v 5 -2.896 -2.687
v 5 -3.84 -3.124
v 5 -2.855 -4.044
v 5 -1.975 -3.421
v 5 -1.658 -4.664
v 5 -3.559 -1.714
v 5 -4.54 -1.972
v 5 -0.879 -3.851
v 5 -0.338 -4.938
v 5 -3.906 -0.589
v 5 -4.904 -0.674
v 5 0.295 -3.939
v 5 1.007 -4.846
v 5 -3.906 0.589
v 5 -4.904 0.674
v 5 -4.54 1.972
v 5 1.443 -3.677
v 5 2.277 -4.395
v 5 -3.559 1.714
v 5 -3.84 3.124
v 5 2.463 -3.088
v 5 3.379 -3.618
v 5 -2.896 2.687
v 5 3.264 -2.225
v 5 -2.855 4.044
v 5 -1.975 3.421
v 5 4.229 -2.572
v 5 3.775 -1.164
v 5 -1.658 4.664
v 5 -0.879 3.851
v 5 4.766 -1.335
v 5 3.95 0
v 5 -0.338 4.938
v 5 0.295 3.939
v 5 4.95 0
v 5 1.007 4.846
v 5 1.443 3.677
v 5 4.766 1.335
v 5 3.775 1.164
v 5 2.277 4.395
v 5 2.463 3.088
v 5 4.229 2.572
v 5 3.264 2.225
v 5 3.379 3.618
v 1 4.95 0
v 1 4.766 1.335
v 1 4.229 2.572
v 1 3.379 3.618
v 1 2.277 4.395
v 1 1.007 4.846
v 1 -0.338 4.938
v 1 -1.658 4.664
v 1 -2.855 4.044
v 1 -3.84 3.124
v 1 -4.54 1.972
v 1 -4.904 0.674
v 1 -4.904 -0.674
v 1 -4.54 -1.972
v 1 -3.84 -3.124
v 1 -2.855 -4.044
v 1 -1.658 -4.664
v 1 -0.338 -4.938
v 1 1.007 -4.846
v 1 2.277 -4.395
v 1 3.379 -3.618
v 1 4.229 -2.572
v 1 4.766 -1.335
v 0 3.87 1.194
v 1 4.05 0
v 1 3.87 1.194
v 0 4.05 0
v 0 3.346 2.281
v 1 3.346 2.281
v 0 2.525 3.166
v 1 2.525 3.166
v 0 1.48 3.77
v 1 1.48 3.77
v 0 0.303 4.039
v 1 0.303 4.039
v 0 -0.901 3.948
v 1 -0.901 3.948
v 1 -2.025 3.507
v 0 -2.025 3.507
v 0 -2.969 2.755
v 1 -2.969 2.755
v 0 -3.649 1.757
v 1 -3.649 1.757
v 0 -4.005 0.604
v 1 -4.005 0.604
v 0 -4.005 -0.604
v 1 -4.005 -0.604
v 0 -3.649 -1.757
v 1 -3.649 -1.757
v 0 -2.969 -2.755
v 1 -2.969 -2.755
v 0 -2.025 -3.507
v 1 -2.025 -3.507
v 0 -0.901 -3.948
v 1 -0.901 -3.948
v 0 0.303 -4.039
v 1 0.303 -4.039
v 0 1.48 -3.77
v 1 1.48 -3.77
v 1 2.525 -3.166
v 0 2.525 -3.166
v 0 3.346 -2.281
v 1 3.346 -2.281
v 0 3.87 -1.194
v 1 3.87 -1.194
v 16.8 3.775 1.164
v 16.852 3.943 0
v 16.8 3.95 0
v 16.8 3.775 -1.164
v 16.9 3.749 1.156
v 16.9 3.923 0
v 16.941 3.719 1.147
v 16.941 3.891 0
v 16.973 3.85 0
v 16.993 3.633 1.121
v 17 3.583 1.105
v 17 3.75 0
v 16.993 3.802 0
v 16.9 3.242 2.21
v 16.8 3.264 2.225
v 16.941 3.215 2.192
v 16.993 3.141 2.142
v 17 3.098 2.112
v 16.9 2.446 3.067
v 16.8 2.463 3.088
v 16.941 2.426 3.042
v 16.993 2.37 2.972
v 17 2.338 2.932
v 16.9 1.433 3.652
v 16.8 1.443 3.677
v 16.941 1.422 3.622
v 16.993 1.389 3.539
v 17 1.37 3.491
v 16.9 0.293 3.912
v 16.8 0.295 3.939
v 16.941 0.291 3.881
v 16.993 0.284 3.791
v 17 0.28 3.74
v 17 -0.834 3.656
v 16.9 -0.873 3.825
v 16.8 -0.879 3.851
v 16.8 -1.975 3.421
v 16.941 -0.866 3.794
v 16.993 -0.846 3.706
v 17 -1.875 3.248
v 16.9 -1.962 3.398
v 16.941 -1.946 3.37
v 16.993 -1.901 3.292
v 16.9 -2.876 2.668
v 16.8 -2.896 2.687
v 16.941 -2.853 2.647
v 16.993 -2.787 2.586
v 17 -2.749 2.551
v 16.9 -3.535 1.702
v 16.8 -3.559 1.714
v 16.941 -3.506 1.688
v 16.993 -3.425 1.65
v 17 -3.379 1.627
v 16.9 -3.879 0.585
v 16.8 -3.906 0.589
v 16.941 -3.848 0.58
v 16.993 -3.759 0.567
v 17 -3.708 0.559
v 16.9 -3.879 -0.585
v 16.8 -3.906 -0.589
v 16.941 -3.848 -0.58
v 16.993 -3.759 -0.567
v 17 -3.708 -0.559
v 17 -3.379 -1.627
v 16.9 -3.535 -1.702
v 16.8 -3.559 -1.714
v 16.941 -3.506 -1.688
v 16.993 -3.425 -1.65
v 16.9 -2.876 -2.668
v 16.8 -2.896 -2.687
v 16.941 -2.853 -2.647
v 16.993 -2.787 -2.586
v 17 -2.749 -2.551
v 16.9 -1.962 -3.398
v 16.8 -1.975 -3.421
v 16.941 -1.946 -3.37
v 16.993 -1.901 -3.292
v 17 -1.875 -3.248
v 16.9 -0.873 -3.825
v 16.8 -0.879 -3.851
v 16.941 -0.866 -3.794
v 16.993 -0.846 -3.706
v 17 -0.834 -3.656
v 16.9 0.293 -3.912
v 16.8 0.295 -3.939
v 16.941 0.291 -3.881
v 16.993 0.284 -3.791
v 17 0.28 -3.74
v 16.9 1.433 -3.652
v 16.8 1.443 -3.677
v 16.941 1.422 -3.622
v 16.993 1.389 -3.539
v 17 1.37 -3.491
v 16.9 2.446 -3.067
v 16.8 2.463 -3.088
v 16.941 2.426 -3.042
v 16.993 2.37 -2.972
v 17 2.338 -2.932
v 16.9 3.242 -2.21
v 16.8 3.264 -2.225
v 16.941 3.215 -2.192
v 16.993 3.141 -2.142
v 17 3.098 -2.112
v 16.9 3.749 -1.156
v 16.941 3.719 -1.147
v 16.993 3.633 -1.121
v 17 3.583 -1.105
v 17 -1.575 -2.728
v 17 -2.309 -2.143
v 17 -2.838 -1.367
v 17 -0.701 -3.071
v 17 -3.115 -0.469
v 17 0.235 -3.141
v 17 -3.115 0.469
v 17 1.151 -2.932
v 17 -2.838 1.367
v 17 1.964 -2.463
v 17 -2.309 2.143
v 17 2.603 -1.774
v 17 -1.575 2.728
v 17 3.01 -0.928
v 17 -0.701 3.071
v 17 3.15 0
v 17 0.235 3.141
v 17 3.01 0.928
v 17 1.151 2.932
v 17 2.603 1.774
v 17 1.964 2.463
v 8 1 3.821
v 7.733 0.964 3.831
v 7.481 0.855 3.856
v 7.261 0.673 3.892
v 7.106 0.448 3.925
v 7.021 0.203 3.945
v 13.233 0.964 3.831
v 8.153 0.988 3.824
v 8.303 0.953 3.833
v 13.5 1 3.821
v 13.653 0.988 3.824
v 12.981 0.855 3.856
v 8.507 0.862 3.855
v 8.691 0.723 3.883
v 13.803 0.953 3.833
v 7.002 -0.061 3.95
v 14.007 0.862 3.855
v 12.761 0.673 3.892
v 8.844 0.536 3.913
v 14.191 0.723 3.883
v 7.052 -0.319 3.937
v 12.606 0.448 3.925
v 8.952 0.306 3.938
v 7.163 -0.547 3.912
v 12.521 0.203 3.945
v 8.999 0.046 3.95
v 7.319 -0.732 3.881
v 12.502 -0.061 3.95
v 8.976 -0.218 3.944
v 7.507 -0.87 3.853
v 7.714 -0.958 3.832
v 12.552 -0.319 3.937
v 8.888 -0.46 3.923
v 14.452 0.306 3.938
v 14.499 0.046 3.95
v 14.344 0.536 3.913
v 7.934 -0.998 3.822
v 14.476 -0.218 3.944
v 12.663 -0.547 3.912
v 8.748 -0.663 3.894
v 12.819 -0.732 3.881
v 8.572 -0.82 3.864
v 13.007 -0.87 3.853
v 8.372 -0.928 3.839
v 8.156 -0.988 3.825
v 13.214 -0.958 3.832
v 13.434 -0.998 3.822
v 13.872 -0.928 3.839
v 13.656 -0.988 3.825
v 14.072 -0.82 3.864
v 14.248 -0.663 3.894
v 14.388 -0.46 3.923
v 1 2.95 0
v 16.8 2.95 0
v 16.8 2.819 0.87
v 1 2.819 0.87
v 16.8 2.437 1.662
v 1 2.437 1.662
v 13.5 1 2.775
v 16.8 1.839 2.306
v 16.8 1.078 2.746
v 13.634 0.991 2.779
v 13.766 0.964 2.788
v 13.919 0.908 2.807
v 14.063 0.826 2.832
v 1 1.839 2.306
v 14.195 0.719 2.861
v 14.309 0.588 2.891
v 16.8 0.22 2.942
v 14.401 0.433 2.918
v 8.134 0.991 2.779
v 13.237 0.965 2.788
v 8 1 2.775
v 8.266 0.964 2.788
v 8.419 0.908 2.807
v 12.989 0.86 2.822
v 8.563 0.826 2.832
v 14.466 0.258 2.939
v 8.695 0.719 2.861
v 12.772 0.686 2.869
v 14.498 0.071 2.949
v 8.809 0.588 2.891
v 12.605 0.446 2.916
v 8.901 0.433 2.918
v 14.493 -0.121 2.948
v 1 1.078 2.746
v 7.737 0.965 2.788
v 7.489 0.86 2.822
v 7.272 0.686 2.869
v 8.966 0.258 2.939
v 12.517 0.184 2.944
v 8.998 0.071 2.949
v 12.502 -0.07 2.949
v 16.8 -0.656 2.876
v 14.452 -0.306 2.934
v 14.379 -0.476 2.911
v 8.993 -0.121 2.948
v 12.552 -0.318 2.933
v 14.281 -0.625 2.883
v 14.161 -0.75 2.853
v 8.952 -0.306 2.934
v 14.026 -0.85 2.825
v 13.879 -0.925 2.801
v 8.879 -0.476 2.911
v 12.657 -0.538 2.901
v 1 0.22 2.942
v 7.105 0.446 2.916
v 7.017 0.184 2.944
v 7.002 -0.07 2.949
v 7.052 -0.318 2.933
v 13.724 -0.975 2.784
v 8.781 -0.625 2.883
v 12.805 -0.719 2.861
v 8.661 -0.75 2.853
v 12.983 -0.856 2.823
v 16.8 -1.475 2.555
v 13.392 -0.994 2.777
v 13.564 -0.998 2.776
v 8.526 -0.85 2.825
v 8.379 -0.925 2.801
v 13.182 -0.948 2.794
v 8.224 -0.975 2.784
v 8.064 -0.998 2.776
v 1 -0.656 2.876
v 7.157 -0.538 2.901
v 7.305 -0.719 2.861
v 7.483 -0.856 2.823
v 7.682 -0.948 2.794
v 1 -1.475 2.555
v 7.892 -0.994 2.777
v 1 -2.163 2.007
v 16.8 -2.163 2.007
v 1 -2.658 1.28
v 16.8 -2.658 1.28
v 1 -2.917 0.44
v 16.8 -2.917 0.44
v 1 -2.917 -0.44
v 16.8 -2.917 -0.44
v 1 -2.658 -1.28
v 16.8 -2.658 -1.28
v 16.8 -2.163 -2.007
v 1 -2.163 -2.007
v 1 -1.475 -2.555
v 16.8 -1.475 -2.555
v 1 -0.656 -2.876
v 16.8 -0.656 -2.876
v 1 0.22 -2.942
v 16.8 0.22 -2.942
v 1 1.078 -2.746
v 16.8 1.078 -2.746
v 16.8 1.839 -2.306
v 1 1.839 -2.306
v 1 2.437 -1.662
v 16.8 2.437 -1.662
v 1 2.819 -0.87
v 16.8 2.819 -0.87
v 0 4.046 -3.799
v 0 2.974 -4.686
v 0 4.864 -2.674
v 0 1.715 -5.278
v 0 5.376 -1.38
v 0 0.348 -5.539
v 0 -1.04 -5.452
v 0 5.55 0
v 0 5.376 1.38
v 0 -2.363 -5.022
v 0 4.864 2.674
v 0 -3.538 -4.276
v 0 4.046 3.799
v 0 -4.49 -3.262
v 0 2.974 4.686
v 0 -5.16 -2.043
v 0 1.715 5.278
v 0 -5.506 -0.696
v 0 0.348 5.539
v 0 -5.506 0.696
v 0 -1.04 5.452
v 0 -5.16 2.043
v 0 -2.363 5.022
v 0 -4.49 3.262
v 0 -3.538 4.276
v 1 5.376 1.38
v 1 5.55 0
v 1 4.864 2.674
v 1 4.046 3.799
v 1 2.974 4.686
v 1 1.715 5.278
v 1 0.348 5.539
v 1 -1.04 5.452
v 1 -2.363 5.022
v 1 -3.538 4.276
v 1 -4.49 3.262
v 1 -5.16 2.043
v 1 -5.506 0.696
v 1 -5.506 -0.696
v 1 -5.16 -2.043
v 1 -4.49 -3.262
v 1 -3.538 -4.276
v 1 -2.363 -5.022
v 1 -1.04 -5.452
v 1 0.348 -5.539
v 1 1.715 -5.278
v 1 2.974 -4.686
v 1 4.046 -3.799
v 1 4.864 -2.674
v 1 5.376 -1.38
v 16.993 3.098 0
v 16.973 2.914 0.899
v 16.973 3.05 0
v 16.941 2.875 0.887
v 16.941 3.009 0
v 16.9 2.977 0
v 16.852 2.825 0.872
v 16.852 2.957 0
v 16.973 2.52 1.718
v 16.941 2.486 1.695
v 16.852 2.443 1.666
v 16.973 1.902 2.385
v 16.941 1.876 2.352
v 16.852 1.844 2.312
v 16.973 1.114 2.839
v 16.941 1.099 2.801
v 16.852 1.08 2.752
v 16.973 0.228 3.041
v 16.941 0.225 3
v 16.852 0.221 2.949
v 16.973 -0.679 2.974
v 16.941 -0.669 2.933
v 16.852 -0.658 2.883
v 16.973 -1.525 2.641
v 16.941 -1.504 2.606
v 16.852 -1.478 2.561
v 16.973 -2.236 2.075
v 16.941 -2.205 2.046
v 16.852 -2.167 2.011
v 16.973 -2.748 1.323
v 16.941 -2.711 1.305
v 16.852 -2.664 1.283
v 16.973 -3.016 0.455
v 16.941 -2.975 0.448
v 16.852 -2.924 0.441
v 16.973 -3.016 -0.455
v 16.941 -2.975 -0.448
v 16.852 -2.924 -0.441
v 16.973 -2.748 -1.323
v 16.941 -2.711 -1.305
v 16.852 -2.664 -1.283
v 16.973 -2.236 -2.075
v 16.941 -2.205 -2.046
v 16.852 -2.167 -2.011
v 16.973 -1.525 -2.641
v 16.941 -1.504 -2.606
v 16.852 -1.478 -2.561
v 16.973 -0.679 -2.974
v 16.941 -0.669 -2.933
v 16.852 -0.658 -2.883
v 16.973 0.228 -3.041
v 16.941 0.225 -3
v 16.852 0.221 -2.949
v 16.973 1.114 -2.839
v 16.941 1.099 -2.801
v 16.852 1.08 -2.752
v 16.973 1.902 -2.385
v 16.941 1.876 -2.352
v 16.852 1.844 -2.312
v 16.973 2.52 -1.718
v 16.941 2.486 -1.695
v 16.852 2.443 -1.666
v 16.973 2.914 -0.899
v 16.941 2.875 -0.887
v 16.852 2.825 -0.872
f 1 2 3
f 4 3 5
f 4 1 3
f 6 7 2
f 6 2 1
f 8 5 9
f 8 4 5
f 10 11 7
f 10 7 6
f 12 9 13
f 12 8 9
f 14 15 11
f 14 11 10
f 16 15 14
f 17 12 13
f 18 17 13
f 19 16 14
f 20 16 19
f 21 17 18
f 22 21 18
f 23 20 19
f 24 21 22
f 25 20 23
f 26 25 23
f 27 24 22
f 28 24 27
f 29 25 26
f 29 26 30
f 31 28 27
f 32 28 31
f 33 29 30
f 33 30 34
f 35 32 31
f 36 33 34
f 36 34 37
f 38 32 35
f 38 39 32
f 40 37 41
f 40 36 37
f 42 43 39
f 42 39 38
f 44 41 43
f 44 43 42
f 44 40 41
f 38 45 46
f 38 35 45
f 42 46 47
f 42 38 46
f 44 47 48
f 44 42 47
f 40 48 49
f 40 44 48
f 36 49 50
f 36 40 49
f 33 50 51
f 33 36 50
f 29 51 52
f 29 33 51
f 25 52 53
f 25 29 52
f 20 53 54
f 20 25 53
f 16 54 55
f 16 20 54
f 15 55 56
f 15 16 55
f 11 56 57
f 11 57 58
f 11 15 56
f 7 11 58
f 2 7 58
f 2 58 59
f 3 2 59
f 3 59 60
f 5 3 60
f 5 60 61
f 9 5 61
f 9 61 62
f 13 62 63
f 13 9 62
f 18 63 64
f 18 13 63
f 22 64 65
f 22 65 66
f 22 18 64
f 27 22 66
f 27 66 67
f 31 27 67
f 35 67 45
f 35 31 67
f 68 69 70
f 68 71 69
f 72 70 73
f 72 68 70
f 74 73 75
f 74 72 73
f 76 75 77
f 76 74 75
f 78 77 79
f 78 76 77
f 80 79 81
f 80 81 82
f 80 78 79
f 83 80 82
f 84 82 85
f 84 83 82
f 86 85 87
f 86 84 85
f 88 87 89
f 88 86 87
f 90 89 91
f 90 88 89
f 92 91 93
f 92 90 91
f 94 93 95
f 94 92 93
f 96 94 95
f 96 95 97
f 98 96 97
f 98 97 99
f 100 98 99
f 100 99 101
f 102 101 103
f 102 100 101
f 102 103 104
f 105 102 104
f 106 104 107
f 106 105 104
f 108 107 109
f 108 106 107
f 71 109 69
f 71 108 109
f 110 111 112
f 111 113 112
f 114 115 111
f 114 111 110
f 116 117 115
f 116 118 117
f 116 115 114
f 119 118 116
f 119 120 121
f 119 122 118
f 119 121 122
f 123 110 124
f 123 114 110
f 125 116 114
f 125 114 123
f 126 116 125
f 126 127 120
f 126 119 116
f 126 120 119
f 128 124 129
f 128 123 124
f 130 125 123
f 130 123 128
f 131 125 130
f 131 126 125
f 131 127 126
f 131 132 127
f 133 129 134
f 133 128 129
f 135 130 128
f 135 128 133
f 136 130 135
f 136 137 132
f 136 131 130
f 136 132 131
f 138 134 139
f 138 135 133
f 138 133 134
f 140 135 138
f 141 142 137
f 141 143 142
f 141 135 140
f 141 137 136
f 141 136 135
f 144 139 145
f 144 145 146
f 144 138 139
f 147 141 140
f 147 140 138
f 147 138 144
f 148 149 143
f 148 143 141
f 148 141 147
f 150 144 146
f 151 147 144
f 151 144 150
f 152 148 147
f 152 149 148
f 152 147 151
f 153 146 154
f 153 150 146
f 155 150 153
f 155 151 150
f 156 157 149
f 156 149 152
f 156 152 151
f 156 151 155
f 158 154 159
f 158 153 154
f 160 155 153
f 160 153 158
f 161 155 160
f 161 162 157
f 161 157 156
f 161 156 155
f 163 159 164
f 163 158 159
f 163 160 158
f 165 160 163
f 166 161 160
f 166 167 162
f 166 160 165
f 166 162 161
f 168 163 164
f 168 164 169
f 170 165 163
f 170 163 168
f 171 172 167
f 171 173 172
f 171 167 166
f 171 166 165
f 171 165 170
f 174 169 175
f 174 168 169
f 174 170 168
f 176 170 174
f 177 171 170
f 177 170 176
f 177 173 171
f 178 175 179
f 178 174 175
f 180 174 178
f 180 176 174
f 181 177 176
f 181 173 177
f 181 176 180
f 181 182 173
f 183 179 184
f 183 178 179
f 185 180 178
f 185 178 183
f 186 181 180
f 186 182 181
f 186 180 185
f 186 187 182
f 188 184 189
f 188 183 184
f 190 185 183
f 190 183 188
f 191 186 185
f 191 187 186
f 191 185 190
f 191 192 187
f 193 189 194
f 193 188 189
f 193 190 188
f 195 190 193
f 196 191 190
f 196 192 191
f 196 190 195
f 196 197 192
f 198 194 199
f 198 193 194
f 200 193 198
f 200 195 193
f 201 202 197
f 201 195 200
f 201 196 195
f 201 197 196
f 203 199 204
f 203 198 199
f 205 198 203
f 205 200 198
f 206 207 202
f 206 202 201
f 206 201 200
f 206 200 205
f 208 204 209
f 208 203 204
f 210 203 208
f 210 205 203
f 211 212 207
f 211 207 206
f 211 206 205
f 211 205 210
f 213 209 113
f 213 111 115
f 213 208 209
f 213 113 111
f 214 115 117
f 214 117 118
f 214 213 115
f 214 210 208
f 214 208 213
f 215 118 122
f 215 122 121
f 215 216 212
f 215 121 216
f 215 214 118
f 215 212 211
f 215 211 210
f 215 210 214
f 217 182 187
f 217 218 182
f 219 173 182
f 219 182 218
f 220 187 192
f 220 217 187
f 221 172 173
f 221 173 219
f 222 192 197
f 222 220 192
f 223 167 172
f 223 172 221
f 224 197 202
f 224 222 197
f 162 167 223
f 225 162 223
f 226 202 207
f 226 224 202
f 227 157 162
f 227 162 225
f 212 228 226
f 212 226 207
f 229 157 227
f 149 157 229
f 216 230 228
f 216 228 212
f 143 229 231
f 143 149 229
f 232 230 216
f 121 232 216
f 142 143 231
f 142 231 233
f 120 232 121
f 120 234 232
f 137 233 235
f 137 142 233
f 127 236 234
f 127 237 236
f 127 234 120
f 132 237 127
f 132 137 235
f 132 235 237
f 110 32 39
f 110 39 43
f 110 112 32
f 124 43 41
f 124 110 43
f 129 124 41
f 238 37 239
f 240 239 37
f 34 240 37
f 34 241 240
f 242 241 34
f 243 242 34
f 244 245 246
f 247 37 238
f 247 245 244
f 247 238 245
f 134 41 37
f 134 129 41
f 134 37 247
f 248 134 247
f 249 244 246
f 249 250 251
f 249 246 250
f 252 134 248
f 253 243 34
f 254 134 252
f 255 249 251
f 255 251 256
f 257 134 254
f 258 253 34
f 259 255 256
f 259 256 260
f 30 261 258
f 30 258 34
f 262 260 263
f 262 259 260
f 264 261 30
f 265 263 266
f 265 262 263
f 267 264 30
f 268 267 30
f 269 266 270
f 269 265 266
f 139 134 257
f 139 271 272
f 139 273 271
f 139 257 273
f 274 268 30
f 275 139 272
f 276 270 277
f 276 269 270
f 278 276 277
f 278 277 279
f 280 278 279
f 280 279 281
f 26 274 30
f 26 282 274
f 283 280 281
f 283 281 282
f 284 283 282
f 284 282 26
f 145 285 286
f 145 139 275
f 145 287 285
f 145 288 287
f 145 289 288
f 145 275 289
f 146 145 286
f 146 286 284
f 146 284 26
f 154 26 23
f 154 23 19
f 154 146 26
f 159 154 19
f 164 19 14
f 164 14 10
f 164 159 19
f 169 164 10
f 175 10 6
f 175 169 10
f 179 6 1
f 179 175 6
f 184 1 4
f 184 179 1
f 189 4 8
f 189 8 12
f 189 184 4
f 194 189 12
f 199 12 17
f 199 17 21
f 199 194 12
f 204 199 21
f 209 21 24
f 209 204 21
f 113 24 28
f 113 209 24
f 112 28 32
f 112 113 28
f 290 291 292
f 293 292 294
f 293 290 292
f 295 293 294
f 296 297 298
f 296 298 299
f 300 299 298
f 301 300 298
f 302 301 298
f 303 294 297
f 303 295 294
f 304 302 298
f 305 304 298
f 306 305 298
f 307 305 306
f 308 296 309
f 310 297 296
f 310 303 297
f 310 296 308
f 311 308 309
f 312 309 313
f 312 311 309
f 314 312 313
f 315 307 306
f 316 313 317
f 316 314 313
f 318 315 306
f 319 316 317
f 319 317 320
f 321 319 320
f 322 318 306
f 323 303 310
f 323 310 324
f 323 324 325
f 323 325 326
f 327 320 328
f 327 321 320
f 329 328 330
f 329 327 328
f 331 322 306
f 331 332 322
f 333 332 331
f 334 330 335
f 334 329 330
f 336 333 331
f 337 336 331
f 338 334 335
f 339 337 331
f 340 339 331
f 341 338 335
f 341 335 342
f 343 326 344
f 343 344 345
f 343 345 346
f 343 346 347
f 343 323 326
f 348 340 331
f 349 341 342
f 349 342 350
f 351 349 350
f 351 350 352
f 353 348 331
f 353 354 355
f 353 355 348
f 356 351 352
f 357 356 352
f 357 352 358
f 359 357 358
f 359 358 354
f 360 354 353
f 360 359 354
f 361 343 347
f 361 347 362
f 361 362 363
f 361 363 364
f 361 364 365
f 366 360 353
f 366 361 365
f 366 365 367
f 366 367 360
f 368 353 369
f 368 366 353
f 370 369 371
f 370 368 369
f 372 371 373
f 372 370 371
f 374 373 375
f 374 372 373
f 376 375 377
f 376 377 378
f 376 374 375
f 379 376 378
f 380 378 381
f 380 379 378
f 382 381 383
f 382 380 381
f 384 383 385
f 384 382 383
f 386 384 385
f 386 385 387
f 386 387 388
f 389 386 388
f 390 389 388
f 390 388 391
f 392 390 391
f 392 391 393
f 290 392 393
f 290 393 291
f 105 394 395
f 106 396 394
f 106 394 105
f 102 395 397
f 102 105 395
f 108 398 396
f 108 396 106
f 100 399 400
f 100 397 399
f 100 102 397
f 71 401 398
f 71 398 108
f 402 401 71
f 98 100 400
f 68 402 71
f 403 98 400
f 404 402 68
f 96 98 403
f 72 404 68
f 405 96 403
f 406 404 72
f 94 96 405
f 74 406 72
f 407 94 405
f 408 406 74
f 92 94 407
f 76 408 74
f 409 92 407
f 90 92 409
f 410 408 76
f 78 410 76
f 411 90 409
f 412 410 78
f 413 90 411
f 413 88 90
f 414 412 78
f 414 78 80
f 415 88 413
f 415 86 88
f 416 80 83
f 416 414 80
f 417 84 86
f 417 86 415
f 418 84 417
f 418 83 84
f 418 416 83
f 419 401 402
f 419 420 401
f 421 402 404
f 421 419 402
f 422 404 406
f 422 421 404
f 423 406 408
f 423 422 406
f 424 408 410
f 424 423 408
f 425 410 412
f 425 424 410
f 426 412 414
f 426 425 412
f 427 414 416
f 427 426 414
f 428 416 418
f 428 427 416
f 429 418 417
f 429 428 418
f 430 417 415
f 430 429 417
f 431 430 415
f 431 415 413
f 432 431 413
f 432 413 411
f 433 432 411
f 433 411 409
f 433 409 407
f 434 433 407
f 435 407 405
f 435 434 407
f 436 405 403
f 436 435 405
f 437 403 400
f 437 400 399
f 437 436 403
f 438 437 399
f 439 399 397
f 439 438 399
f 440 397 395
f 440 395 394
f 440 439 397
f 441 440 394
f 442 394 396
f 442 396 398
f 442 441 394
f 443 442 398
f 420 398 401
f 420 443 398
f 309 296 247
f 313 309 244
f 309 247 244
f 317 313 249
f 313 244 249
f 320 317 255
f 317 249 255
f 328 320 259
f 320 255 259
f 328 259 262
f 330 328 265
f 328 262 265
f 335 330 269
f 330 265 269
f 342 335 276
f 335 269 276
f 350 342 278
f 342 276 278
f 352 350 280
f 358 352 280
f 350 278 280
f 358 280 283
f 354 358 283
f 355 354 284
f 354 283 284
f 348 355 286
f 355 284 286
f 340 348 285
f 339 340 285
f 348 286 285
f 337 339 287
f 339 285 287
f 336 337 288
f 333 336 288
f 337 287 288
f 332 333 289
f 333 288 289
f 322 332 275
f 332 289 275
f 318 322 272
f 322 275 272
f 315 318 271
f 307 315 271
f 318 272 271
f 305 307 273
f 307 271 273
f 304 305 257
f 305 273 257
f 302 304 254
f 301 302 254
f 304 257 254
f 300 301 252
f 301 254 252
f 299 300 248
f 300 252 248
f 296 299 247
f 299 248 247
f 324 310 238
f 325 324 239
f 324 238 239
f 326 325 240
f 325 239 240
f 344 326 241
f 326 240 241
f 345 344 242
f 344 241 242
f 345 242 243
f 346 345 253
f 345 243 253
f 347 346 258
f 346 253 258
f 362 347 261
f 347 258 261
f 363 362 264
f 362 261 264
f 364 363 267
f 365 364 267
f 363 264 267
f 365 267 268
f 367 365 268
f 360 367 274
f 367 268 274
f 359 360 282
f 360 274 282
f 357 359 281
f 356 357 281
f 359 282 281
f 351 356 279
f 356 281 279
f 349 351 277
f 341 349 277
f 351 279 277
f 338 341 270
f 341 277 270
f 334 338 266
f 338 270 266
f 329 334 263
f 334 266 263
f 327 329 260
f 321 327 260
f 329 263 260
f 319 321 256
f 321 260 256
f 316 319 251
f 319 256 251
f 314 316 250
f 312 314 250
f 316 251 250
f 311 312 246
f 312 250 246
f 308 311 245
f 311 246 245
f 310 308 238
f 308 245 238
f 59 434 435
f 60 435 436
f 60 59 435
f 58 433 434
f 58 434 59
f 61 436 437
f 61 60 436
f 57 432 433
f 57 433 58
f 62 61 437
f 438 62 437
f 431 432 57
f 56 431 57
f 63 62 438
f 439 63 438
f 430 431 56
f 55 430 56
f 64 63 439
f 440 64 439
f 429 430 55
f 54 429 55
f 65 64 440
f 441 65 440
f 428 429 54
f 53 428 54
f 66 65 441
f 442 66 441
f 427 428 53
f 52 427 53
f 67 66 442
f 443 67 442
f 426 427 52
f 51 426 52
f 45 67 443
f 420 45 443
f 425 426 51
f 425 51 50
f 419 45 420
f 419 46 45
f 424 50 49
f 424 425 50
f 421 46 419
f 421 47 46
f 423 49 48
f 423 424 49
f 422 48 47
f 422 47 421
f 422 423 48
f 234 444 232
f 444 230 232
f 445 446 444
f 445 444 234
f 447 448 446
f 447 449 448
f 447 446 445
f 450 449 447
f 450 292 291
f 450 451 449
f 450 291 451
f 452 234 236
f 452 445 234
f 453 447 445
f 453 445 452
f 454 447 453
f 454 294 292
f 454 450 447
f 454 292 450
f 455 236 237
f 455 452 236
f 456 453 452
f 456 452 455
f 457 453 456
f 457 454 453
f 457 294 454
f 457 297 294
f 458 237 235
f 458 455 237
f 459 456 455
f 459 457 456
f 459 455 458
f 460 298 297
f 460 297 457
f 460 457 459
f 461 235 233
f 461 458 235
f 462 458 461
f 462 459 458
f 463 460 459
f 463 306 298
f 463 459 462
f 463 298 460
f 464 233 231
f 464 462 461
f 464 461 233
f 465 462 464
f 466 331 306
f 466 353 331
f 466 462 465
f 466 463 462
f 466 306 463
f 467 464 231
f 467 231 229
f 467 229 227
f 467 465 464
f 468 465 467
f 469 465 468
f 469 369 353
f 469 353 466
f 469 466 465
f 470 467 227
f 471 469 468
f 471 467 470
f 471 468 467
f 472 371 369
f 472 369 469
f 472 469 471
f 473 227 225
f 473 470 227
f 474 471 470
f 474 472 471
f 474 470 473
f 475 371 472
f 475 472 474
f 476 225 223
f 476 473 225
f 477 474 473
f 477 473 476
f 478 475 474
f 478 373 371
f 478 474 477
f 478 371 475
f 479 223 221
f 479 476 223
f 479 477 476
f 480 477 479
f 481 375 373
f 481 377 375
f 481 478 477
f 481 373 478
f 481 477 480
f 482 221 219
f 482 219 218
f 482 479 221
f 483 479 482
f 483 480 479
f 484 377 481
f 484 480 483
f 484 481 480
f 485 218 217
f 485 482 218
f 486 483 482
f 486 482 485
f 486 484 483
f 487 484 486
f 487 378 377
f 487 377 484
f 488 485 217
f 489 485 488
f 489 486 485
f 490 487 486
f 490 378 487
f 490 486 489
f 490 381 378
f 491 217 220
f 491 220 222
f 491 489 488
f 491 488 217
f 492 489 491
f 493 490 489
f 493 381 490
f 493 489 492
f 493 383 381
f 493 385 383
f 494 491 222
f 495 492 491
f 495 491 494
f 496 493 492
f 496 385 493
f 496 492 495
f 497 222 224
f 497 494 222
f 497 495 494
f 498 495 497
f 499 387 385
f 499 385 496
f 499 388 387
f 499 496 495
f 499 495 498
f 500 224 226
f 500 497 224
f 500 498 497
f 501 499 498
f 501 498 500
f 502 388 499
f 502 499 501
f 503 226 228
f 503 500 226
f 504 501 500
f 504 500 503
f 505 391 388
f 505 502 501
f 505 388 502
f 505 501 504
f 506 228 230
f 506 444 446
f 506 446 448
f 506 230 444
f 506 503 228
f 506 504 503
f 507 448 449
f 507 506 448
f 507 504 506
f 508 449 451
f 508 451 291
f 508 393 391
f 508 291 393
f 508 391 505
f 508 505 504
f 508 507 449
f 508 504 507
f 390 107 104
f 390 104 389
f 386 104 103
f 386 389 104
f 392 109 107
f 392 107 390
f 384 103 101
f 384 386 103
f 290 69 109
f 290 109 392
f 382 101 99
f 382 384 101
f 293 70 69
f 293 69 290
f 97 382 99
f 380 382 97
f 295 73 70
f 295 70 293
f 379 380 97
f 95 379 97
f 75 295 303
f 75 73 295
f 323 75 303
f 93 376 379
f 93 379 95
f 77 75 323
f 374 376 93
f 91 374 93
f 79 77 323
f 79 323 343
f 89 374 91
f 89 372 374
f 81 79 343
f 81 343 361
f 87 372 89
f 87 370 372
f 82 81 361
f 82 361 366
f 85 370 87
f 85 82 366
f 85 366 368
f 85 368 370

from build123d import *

# Parameters (mm, degrees)
ESQUISSE4_W               = 1
ESQUISSE4_H               = 5.55
D_GAGEMENT_M21_AT_2_COUNT = 2
D_GAGEMENT_M21_AT_2_PITCH = 5.5


with BuildPart() as part:
    # Esquisse1 → Révolution1 (revolve)
    with BuildSketch(Plane.XY):
        with BuildLine():
            Line((0, 4.05), (0, 5.55))
            Line((0, 5.55), (1, 5.55))
            Line((1, 5.55), (1, 4.95))
            Line((1, 4.95), (5, 4.95))
            Line((5, 4.95), (5, 3.95))
            Line((5, 3.95), (16.8, 3.95))
            ThreePointArc((16.8, 3.95), (16.941421356, 3.891421356), (17, 3.75))
            Line((17, 3.75), (17, 3.15))
            ThreePointArc((17, 3.15), (16.941421356, 3.008578644), (16.8, 2.95))
            Line((16.8, 2.95), (1, 2.95))
            Line((1, 2.95), (1, 4.05))
            Line((1, 4.05), (0, 4.05))
        make_face()
    revolve(axis=Axis((-11.300588411, 0, 0), (1, 0, 0)))

    # Esquisse4 → Dégagement M21 (revolve, cut)
    with BuildSketch(Plane.YZ.offset(8)):
        with Locations((0.5, 2.775)):
            Rectangle(ESQUISSE4_W, ESQUISSE4_H)
    d_gagement_m21 = revolve(axis=Axis((8, 0, -6.35), (0, 0, 1)), mode=Mode.SUBTRACT)

    # Dégagement M21 at 2: Dégagement M21 ×2
    with Locations(*[(i * D_GAGEMENT_M21_AT_2_PITCH, 0, 0) for i in range(1, D_GAGEMENT_M21_AT_2_COUNT)]):
        add(d_gagement_m21, mode=Mode.SUBTRACT)


solid = part.part
